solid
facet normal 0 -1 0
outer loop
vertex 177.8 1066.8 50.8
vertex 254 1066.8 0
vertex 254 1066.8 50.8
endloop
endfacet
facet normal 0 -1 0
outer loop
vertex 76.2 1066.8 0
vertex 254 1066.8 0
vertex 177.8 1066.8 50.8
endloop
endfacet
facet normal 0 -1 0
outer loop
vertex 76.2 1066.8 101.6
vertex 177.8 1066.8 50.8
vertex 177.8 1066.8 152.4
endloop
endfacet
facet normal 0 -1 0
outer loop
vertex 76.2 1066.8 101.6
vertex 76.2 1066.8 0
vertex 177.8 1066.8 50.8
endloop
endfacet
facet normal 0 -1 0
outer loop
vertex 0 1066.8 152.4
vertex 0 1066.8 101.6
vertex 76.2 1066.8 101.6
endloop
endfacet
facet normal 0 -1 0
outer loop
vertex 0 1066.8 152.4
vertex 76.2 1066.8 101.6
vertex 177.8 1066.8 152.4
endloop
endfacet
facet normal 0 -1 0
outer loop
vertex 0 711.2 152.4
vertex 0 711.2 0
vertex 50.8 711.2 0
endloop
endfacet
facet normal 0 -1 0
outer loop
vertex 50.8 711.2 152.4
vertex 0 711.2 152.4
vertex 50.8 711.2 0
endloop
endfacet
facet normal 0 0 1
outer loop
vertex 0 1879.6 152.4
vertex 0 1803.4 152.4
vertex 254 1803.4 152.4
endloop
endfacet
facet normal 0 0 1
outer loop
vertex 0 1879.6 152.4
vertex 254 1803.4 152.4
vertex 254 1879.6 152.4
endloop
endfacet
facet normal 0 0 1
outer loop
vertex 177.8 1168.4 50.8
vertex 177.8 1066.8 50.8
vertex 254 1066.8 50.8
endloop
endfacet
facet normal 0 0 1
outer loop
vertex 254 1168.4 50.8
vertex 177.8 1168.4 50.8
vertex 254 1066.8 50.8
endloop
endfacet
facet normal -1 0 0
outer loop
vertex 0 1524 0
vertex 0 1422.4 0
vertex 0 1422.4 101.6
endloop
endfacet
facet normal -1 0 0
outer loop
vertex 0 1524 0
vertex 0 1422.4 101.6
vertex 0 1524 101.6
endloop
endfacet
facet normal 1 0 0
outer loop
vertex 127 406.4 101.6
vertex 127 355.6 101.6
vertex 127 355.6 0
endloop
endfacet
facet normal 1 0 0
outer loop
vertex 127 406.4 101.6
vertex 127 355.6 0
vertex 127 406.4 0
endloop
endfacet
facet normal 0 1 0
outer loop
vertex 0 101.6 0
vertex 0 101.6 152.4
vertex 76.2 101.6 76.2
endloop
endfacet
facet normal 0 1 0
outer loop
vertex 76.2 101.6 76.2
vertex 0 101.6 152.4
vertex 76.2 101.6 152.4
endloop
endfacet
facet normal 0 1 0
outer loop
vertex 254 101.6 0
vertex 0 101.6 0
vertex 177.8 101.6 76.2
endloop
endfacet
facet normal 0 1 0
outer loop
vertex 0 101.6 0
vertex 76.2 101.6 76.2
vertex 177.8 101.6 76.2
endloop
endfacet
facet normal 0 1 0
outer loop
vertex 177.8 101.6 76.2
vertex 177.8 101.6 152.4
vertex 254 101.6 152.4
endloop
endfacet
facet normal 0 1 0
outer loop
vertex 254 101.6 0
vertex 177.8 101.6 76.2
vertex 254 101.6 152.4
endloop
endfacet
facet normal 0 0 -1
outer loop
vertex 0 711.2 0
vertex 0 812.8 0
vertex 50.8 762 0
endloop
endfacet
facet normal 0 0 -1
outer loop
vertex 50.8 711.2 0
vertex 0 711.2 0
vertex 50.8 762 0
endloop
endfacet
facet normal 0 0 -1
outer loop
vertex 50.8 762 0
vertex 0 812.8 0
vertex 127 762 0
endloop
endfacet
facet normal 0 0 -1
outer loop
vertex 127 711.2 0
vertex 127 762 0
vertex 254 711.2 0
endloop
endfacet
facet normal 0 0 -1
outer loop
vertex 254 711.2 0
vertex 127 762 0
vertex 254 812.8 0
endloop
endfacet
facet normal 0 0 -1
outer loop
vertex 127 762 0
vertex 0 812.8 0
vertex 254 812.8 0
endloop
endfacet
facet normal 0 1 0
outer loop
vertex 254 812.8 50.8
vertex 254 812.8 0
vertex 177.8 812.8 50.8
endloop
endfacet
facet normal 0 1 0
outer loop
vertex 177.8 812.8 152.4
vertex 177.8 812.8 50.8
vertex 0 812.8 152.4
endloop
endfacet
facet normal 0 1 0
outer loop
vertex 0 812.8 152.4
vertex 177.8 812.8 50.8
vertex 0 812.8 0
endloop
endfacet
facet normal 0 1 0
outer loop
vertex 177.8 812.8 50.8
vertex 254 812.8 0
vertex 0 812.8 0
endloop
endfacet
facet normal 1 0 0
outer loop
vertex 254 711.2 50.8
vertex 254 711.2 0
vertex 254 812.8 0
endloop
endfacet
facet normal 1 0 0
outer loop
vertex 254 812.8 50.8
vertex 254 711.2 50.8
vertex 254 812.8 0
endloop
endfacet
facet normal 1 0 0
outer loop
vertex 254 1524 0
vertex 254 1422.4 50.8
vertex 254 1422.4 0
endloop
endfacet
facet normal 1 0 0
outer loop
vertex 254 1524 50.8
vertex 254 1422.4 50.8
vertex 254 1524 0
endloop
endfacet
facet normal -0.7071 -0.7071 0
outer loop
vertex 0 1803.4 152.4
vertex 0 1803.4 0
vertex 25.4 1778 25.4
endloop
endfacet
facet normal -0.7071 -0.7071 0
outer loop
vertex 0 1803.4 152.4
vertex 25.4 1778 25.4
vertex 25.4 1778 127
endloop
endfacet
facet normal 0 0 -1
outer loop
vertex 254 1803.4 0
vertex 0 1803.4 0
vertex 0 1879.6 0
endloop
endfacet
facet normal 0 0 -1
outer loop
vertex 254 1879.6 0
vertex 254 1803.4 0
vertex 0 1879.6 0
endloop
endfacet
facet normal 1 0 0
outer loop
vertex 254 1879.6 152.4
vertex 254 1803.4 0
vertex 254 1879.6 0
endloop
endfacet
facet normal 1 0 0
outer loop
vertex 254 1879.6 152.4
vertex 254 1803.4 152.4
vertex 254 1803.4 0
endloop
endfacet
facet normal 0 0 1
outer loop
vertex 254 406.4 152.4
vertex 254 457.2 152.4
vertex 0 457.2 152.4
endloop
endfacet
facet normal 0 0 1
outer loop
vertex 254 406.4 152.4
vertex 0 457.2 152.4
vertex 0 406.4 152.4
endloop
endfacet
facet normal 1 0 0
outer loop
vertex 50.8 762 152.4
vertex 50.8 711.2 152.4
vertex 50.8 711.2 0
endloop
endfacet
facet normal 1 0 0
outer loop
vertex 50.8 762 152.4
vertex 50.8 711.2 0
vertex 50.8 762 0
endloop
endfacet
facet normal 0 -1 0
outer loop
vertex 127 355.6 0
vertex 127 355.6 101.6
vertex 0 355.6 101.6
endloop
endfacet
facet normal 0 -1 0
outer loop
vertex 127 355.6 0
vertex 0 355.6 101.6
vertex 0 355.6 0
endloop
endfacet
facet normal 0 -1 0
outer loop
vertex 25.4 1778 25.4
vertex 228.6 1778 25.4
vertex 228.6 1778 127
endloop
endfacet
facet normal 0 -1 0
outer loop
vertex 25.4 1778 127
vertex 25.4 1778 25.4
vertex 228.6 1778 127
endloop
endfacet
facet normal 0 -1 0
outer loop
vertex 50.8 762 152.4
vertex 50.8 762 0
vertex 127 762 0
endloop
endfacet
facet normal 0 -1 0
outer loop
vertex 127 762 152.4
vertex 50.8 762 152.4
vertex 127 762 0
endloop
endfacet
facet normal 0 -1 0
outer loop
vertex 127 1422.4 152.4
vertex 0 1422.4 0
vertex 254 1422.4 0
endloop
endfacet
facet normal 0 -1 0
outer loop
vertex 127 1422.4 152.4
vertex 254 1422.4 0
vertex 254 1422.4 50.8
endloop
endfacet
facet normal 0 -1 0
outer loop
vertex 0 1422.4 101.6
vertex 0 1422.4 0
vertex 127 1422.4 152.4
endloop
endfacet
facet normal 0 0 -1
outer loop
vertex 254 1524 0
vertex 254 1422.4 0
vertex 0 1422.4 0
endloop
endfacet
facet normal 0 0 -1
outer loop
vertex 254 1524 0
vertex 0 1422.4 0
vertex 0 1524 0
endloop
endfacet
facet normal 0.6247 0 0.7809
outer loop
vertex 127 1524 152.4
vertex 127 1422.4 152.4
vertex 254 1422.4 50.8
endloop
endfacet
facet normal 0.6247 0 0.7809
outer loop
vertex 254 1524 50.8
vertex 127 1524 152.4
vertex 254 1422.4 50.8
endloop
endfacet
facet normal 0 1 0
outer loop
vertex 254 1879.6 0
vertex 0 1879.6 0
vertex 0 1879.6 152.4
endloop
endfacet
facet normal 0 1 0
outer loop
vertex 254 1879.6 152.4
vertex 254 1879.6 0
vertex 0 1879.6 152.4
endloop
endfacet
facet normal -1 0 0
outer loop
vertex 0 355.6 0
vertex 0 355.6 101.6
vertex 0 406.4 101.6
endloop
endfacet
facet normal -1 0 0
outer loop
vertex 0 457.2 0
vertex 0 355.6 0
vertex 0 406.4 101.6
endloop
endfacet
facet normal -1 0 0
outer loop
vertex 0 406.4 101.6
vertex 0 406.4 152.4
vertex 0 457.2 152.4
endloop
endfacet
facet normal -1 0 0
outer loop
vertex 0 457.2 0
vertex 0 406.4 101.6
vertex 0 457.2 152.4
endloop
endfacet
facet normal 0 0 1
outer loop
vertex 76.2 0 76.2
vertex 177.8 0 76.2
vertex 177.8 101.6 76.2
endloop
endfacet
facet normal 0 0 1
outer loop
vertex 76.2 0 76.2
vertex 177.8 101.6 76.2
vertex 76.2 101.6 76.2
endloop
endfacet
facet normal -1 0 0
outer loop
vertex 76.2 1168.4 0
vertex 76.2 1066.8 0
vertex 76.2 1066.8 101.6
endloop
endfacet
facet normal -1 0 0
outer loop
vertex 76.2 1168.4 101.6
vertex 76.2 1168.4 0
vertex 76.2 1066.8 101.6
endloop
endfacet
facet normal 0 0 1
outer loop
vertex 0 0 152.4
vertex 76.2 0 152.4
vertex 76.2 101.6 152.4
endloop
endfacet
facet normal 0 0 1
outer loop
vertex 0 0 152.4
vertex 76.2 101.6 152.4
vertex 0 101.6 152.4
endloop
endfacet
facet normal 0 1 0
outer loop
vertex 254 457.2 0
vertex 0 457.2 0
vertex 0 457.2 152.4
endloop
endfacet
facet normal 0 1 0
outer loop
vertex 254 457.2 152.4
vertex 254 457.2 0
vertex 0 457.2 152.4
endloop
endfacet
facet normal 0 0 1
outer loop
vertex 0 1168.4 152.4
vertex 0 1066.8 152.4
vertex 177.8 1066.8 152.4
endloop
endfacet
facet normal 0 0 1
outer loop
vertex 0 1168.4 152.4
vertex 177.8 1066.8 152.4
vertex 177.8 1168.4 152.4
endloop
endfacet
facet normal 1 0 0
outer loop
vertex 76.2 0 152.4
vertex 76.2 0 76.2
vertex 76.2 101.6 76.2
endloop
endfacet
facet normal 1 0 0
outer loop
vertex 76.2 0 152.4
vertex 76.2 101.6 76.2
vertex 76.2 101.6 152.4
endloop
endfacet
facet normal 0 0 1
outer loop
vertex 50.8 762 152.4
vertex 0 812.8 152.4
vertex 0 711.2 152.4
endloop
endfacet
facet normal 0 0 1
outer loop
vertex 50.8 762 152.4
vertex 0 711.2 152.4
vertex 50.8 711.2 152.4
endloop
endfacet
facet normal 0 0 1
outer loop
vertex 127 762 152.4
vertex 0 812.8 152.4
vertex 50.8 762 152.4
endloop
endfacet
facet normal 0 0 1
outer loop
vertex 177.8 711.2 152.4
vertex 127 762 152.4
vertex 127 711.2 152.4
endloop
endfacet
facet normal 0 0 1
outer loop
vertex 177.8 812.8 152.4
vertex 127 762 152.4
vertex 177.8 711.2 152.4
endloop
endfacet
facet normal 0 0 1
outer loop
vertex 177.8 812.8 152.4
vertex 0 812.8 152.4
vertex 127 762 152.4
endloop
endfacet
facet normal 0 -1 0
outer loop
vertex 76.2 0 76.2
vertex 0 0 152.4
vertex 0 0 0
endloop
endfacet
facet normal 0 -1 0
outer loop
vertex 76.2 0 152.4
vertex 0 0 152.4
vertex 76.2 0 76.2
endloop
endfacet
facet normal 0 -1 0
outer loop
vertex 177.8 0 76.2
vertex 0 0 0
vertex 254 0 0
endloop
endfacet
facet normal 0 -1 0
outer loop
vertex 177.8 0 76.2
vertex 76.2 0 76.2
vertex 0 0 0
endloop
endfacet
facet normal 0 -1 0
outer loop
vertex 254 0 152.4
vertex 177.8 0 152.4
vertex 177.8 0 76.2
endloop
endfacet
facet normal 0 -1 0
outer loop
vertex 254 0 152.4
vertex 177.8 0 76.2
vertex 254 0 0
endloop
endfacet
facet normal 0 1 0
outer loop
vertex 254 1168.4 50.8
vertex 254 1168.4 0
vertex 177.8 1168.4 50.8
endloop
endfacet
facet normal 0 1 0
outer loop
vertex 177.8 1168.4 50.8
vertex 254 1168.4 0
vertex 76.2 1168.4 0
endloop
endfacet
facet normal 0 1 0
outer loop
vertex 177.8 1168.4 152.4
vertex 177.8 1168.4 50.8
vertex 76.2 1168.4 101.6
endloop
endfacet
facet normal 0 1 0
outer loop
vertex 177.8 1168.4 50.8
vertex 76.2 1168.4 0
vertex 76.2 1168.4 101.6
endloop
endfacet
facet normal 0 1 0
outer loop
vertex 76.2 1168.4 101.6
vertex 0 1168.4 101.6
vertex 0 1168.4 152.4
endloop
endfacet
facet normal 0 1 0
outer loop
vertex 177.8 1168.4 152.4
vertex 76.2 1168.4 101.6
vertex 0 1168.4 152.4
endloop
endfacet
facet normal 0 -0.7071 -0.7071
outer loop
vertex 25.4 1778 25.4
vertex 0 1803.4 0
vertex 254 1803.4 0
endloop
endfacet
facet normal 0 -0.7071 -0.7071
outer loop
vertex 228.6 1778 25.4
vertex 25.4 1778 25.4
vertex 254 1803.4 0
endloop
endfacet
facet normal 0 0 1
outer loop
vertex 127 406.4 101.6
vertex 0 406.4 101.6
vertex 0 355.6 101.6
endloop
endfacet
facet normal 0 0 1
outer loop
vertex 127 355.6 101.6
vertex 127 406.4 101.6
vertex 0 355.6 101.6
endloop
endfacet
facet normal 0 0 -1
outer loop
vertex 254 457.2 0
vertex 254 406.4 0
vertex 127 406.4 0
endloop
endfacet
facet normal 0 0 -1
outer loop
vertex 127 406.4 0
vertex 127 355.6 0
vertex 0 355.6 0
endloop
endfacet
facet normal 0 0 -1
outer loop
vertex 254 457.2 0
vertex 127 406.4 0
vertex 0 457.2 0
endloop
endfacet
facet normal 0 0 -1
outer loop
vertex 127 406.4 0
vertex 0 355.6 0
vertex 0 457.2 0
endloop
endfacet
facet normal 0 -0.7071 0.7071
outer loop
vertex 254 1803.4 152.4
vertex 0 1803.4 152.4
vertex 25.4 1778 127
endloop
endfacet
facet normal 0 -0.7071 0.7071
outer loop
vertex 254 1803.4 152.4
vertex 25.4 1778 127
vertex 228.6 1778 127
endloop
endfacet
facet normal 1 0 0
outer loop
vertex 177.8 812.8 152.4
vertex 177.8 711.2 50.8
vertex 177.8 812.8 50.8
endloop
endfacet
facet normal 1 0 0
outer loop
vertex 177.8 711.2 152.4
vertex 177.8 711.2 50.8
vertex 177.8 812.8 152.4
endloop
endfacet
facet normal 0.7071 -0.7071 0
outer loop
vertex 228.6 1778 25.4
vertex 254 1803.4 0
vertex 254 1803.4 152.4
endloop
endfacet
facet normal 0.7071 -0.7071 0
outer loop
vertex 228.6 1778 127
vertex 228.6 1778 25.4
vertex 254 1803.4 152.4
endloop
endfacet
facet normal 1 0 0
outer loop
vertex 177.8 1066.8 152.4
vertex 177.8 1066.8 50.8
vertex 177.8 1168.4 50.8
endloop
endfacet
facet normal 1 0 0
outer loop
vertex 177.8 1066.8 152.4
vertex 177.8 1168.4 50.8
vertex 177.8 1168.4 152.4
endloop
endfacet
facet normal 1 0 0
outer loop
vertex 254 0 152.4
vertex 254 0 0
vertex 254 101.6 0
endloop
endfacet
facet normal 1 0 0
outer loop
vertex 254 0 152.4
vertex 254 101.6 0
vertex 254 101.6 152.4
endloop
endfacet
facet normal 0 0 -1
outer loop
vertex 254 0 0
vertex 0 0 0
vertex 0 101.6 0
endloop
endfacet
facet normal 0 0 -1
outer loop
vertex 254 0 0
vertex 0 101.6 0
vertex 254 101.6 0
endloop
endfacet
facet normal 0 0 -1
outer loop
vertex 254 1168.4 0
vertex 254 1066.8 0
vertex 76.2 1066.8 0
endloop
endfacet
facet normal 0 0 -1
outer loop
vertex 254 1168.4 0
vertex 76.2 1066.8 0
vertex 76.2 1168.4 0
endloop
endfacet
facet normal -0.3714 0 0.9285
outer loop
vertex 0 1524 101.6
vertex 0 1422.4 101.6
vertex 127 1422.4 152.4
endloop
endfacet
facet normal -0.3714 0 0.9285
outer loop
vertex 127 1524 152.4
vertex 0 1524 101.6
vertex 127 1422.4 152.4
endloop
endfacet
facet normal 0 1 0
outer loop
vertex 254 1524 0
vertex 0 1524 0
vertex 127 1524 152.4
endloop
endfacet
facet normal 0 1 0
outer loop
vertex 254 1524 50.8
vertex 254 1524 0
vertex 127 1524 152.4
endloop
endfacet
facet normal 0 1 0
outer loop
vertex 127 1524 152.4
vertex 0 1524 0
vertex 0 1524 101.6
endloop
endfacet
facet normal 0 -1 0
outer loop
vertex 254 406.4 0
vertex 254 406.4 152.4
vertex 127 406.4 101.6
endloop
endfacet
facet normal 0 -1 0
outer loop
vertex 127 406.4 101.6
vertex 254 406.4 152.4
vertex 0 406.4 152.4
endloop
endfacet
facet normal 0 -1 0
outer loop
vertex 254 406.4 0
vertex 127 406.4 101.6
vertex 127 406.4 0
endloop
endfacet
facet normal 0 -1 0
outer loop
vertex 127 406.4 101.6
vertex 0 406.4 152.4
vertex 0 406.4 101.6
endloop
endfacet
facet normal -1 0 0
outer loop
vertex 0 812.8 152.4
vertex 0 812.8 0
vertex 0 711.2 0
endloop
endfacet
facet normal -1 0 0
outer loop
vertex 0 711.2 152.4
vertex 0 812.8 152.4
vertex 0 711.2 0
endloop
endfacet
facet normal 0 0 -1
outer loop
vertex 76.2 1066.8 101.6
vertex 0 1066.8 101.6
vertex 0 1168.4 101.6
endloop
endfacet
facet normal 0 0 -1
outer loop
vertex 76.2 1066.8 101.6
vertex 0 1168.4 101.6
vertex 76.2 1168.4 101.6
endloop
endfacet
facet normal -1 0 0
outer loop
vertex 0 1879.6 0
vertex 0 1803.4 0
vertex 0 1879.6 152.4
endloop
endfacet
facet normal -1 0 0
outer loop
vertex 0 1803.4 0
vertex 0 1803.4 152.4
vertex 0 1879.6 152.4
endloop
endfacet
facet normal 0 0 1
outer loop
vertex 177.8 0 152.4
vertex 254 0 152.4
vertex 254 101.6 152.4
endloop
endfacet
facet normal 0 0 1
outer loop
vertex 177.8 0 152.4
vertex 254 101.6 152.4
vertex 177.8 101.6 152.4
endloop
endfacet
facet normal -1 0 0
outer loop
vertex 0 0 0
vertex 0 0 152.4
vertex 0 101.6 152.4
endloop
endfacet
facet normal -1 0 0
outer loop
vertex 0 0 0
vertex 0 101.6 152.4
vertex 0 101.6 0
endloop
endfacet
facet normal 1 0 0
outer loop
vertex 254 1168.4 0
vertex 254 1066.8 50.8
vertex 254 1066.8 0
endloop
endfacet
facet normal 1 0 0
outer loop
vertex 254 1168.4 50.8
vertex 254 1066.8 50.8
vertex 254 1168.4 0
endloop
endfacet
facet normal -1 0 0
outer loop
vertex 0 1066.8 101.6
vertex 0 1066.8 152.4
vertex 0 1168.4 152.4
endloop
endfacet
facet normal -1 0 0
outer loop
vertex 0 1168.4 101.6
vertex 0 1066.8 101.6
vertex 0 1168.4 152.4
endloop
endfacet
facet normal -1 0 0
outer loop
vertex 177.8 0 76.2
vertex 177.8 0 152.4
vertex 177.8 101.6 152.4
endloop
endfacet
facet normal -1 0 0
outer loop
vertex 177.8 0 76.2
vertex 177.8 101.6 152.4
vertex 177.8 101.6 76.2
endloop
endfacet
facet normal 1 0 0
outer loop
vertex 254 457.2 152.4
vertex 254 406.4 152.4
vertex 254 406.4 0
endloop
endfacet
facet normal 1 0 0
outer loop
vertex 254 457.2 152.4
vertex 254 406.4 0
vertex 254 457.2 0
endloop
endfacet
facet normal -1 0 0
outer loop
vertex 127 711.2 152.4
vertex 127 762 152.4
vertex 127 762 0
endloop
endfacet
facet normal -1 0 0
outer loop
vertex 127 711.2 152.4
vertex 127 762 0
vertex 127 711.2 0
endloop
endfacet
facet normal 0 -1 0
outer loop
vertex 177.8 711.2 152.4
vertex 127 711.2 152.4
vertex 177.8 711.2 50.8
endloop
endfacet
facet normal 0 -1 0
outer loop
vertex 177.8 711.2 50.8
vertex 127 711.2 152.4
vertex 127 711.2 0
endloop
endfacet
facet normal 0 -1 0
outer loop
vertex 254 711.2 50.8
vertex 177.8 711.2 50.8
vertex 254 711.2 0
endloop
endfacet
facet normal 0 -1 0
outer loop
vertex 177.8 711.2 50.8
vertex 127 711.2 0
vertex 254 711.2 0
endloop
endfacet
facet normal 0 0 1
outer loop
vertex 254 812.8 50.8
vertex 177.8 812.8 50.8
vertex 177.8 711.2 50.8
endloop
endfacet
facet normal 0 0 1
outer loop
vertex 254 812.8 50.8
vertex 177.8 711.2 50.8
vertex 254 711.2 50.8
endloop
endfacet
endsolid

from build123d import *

# Parameters (mm, degrees)
F1_DEPTH  = 101.6
F3_DEPTH  = 254
F4_W      = 50.8
F4_H      = 101.6
F5_DEPTH  = 127
F7_DEPTH  = 152.4
F8_W      = 76.2
F8_H      = 101.6
F9_DEPTH  = 101.6
F10_W     = 101.6
F10_H     = 152.4
F11_DEPTH = 254
F12_W     = 76.2
F12_H     = 101.6
F13_DEPTH = 101.6
F14_W     = 76.2
F14_H     = 101.6
F15_DEPTH = 101.6
F16_W     = 101.6
F16_H     = 152.4
F17_DEPTH = 254
F19_DEPTH = 101.6
F21_DEPTH = 101.6
F22_W     = 101.6
F22_H     = 152.4
F23_DEPTH = 254
F24_SIZE  = 25.4


with BuildPart() as f1:
    # F0 (on Front) → F1 (new body)
    with BuildSketch(Plane.XZ):
        Polygon((0, 152.4), (0, 0), (254, 0), (254, 152.4), (177.8, 152.4), (177.8, 76.2), (76.2, 76.2), (76.2, 152.4), align=None)
    extrude(amount=-F1_DEPTH)


with BuildPart() as f3:
    # F2 (on Right) → F3 (new body)
    with BuildSketch(Plane.YZ):
        Polygon((355.6, 101.6), (355.6, 0), (457.2, 0), (457.2, 152.4), (406.4, 152.4), (406.4, 101.6), align=None)
    extrude(amount=F3_DEPTH)

    # F4 (on face) → F5 (cut)
    with BuildSketch(Plane.YZ.offset(254)):
        with Locations((381, 50.8)):
            Rectangle(F4_W, F4_H)
    extrude(amount=-F5_DEPTH, mode=Mode.SUBTRACT)


with BuildPart() as f7:
    # F6 (on Top) → F7 (new body)
    with BuildSketch(Plane.XY):
        Polygon((0, 812.8), (0, 711.2), (50.8, 711.2), (50.8, 762), (127, 762), (127, 711.2), (254, 711.2), (254, 812.8), align=None)
    extrude(amount=F7_DEPTH)

    # F8 (on face) → F9 (cut)
    with BuildSketch(Plane.XZ.offset(-711.2)):
        with Locations((215.9, 101.6)):
            Rectangle(F8_W, F8_H)
    extrude(amount=-F9_DEPTH, mode=Mode.SUBTRACT)


with BuildPart() as f11:
    # F10 (on Right) → F11 (new body)
    with BuildSketch(Plane.YZ):
        with Locations((1117.6, 76.2)):
            Rectangle(F10_W, F10_H)
    extrude(amount=F11_DEPTH)

    # F12 (on face) → F13 (cut)
    with BuildSketch(Plane.XZ.offset(-1066.8)):
        with Locations((215.9, 101.6)):
            Rectangle(F12_W, F12_H)
    extrude(amount=-F13_DEPTH, mode=Mode.SUBTRACT)

    # F14 (on face) → F15 (cut)
    with BuildSketch(Plane.XZ.offset(-1066.8)):
        with Locations((38.1, 50.8)):
            Rectangle(F14_W, F14_H)
    extrude(amount=-F15_DEPTH, mode=Mode.SUBTRACT)


with BuildPart() as f17:
    # F16 (on Right) → F17 (new body)
    with BuildSketch(Plane.YZ):
        with Locations((1473.2, 76.2)):
            Rectangle(F16_W, F16_H)
    extrude(amount=F17_DEPTH)

    # F18 (on face) → F19 (cut)
    with BuildSketch(Plane.XZ.offset(-1422.4)):
        Polygon((127, 152.4), (254, 50.8), (254, 152.4), align=None)
    extrude(amount=-F19_DEPTH, mode=Mode.SUBTRACT)

    # F20 (on face) → F21 (cut)
    with BuildSketch(Plane.XZ.offset(-1422.4)):
        Polygon((127, 152.4), (0, 152.4), (0, 101.6), align=None)
    extrude(amount=-F21_DEPTH, mode=Mode.SUBTRACT)


with BuildPart() as f23:
    # F22 (on Right) → F23 (new body)
    with BuildSketch(Plane.YZ):
        with Locations((1828.8, 76.2)):
            Rectangle(F22_W, F22_H)
    extrude(amount=F23_DEPTH)

    # F24
    f24_edges = [f23.edges().sort_by_distance(p)[0] for p in [
        (127, 1778, 152.4),
        (127, 1778, 0),
        (0, 1778, 76.2),
        (254, 1778, 76.2),
    ]]
    chamfer(f24_edges, length=F24_SIZE)


solid = Compound([f1.part, f3.part, f7.part, f11.part, f17.part, f23.part])
